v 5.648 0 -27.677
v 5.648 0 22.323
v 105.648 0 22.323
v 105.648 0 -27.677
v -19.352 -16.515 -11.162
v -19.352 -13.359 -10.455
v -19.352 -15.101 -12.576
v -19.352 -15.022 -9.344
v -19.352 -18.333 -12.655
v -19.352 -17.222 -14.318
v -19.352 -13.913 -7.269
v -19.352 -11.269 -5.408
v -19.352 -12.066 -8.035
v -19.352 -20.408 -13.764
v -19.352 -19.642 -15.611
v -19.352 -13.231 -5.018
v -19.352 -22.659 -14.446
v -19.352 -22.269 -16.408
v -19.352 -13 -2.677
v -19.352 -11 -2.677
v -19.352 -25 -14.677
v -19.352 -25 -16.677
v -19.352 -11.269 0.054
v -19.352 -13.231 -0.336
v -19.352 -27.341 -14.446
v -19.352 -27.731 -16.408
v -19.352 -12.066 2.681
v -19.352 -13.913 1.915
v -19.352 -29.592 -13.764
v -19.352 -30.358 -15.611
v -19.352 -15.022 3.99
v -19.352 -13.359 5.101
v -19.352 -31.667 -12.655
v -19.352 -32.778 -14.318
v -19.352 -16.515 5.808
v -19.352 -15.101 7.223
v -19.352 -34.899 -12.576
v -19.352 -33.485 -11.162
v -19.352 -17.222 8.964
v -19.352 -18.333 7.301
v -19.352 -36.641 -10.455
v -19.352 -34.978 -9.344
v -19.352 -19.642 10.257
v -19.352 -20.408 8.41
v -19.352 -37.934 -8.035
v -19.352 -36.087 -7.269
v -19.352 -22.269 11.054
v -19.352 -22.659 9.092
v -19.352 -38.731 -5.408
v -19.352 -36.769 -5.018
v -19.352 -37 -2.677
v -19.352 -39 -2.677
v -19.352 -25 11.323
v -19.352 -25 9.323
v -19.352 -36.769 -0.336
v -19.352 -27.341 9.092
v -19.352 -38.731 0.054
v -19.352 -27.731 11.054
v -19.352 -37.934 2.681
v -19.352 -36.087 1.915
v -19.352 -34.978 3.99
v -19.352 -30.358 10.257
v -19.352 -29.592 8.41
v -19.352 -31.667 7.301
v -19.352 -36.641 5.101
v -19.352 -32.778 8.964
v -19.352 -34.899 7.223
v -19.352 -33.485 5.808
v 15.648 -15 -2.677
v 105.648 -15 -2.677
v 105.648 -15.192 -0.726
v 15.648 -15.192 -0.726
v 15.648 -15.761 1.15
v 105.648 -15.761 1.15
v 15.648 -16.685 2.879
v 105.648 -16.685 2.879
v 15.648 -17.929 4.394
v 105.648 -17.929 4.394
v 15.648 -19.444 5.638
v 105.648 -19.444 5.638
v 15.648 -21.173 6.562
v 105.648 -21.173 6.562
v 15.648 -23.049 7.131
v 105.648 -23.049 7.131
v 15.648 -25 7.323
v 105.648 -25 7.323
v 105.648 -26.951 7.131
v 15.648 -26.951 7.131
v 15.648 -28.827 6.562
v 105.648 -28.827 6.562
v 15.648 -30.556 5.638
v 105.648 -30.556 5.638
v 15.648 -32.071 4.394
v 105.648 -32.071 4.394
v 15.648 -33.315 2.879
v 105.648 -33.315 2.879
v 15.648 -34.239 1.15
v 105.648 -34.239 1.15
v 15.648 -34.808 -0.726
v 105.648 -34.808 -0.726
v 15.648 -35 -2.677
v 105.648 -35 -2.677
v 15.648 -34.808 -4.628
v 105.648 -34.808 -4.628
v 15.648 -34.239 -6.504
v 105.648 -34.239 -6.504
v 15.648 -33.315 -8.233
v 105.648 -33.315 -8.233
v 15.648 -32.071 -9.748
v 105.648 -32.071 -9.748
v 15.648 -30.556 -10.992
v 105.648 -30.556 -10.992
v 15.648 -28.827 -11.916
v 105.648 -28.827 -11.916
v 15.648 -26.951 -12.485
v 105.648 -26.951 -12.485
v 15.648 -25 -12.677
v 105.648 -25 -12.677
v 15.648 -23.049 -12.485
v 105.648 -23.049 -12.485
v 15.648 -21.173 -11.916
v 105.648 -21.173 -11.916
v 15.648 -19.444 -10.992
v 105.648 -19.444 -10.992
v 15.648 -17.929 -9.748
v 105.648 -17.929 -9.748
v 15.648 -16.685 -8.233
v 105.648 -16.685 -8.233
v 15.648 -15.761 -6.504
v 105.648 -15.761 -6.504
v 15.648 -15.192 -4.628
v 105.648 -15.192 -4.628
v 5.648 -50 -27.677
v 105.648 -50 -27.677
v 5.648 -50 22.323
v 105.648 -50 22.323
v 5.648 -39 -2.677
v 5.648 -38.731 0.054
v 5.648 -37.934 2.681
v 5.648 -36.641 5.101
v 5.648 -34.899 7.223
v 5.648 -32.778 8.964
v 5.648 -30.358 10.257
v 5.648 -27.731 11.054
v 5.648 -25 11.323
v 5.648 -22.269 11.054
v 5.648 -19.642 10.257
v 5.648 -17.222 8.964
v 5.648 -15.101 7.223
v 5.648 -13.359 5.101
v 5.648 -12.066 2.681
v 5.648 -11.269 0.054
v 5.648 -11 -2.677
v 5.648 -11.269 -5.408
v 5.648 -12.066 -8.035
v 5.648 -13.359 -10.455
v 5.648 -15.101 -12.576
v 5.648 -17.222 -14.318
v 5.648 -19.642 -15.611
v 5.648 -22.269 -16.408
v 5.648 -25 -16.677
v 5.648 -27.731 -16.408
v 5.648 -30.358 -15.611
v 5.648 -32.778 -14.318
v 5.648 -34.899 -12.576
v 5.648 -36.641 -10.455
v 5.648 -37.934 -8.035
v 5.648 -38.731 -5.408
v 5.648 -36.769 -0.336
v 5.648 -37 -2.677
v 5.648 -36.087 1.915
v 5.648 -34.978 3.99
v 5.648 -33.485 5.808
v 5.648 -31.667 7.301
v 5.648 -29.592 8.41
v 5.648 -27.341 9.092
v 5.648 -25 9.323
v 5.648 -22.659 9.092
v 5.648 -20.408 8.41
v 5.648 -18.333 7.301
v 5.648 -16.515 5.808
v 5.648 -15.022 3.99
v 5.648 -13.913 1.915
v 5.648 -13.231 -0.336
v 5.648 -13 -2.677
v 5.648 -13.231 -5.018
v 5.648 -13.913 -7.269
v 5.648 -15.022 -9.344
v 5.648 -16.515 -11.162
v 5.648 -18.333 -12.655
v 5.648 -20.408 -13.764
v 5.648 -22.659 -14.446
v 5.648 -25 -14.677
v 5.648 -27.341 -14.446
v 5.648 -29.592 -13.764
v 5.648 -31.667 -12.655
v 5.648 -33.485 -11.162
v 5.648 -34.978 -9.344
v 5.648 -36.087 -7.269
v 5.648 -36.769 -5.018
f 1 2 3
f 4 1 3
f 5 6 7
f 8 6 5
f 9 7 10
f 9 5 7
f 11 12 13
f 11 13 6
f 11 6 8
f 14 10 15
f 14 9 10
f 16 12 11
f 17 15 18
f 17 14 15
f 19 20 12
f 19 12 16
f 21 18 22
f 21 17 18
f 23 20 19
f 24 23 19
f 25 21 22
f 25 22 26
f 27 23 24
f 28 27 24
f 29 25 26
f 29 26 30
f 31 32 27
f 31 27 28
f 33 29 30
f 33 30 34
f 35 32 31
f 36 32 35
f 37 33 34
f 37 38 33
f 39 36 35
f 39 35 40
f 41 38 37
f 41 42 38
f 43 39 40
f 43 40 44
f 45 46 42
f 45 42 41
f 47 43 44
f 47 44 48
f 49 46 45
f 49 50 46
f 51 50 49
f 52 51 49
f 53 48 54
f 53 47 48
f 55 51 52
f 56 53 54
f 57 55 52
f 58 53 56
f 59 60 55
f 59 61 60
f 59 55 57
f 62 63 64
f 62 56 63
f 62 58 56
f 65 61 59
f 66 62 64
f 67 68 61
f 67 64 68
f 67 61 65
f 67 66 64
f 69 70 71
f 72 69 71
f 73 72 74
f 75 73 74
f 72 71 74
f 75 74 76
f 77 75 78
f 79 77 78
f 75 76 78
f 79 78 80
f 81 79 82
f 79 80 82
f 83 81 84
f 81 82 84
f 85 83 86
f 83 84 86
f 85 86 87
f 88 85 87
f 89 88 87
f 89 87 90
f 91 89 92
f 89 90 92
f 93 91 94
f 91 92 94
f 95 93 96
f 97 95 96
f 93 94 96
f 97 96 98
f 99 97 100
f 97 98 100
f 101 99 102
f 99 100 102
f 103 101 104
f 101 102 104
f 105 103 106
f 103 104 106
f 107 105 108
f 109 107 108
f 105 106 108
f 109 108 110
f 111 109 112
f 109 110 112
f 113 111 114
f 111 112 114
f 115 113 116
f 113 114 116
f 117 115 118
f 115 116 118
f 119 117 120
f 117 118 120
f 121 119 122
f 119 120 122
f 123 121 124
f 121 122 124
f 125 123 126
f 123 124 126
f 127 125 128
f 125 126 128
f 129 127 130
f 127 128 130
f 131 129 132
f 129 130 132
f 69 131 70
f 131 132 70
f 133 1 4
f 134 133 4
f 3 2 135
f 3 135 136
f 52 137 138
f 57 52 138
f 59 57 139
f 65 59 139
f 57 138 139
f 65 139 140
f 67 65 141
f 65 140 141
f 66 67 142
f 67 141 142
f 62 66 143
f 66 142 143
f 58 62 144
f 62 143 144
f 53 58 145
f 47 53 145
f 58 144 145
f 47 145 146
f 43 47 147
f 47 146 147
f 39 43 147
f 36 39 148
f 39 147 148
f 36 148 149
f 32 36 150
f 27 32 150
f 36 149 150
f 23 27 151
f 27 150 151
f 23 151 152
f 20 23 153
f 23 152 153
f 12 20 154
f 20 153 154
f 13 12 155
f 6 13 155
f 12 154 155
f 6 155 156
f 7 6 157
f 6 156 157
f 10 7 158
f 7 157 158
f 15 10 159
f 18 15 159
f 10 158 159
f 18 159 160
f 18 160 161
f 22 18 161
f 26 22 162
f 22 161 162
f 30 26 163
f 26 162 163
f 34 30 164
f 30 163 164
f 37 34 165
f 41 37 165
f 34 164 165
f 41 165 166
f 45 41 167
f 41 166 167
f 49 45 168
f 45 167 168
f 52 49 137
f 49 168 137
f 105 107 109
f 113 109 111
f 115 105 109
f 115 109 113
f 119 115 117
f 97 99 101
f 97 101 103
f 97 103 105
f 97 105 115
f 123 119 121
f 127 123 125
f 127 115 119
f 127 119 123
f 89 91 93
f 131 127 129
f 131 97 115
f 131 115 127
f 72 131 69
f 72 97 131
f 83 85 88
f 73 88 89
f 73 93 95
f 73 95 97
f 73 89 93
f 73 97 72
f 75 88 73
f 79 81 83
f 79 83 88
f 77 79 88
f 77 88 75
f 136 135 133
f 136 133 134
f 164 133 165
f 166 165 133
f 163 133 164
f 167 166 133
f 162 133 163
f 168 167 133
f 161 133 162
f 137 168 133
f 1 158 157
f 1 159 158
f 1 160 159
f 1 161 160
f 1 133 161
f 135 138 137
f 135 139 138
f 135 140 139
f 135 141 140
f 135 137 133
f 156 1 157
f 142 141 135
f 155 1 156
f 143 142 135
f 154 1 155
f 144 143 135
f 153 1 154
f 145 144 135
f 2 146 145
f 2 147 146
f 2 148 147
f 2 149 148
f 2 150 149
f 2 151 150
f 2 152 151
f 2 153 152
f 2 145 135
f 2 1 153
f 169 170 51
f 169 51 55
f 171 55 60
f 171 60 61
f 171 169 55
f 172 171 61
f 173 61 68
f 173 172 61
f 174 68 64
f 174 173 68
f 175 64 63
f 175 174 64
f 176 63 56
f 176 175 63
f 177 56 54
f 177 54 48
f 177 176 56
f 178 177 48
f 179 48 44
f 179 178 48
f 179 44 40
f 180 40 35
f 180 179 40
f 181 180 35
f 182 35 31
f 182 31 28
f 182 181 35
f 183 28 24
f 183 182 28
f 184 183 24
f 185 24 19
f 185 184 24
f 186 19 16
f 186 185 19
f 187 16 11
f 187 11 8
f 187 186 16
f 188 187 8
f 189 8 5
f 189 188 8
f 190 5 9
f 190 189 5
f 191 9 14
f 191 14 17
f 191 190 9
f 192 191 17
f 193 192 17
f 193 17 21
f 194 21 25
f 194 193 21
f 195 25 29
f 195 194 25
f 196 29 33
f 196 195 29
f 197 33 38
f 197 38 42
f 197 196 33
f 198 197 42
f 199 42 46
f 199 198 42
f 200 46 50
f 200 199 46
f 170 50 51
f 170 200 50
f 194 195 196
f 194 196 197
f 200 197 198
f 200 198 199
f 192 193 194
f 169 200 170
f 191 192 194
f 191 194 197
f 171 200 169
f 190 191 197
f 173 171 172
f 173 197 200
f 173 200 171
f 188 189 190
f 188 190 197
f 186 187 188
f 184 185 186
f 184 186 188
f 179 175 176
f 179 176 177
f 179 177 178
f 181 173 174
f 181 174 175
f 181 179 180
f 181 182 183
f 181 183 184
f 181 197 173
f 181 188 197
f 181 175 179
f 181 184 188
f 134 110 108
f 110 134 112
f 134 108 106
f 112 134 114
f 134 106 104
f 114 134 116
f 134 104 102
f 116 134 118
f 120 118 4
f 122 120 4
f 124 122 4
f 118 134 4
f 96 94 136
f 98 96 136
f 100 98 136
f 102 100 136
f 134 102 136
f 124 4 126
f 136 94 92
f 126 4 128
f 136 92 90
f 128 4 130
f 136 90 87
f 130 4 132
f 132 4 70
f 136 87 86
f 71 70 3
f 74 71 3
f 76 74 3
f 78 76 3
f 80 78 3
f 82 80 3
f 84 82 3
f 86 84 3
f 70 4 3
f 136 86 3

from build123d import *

# Parameters (mm, degrees)
F0_W     = 100
F0_H     = 50
F1_DEPTH = 50
F2_R     = 14
F2_R_2   = 12
F3_DEPTH = 25
F4_R     = 10
F5_DEPTH = 90


with BuildPart() as f1:
    # F0 (on Front) → F1 (new body)
    with BuildSketch(Plane.XZ):
        with Locations((55.64848, -2.676977)):
            Rectangle(F0_W, F0_H)
    extrude(amount=F1_DEPTH)

    # F2 (on face) → F3 (join)
    with BuildSketch(Plane(origin=(5.64848, 0, 0), x_dir=(0, -1, 0), z_dir=(-1, 0, 0))):
        with Locations((25, -2.676977)):
            Circle(F2_R)
        with Locations((25, -2.676977)):
            Circle(F2_R_2, mode=Mode.SUBTRACT)
    extrude(amount=F3_DEPTH)

    # F4 (on face) → F5 (cut)
    with BuildSketch(Plane.YZ.offset(105.64848)):
        with Locations((-25, -2.676977)):
            Circle(F4_R)
    extrude(amount=-F5_DEPTH, mode=Mode.SUBTRACT)


solid = f1.part
